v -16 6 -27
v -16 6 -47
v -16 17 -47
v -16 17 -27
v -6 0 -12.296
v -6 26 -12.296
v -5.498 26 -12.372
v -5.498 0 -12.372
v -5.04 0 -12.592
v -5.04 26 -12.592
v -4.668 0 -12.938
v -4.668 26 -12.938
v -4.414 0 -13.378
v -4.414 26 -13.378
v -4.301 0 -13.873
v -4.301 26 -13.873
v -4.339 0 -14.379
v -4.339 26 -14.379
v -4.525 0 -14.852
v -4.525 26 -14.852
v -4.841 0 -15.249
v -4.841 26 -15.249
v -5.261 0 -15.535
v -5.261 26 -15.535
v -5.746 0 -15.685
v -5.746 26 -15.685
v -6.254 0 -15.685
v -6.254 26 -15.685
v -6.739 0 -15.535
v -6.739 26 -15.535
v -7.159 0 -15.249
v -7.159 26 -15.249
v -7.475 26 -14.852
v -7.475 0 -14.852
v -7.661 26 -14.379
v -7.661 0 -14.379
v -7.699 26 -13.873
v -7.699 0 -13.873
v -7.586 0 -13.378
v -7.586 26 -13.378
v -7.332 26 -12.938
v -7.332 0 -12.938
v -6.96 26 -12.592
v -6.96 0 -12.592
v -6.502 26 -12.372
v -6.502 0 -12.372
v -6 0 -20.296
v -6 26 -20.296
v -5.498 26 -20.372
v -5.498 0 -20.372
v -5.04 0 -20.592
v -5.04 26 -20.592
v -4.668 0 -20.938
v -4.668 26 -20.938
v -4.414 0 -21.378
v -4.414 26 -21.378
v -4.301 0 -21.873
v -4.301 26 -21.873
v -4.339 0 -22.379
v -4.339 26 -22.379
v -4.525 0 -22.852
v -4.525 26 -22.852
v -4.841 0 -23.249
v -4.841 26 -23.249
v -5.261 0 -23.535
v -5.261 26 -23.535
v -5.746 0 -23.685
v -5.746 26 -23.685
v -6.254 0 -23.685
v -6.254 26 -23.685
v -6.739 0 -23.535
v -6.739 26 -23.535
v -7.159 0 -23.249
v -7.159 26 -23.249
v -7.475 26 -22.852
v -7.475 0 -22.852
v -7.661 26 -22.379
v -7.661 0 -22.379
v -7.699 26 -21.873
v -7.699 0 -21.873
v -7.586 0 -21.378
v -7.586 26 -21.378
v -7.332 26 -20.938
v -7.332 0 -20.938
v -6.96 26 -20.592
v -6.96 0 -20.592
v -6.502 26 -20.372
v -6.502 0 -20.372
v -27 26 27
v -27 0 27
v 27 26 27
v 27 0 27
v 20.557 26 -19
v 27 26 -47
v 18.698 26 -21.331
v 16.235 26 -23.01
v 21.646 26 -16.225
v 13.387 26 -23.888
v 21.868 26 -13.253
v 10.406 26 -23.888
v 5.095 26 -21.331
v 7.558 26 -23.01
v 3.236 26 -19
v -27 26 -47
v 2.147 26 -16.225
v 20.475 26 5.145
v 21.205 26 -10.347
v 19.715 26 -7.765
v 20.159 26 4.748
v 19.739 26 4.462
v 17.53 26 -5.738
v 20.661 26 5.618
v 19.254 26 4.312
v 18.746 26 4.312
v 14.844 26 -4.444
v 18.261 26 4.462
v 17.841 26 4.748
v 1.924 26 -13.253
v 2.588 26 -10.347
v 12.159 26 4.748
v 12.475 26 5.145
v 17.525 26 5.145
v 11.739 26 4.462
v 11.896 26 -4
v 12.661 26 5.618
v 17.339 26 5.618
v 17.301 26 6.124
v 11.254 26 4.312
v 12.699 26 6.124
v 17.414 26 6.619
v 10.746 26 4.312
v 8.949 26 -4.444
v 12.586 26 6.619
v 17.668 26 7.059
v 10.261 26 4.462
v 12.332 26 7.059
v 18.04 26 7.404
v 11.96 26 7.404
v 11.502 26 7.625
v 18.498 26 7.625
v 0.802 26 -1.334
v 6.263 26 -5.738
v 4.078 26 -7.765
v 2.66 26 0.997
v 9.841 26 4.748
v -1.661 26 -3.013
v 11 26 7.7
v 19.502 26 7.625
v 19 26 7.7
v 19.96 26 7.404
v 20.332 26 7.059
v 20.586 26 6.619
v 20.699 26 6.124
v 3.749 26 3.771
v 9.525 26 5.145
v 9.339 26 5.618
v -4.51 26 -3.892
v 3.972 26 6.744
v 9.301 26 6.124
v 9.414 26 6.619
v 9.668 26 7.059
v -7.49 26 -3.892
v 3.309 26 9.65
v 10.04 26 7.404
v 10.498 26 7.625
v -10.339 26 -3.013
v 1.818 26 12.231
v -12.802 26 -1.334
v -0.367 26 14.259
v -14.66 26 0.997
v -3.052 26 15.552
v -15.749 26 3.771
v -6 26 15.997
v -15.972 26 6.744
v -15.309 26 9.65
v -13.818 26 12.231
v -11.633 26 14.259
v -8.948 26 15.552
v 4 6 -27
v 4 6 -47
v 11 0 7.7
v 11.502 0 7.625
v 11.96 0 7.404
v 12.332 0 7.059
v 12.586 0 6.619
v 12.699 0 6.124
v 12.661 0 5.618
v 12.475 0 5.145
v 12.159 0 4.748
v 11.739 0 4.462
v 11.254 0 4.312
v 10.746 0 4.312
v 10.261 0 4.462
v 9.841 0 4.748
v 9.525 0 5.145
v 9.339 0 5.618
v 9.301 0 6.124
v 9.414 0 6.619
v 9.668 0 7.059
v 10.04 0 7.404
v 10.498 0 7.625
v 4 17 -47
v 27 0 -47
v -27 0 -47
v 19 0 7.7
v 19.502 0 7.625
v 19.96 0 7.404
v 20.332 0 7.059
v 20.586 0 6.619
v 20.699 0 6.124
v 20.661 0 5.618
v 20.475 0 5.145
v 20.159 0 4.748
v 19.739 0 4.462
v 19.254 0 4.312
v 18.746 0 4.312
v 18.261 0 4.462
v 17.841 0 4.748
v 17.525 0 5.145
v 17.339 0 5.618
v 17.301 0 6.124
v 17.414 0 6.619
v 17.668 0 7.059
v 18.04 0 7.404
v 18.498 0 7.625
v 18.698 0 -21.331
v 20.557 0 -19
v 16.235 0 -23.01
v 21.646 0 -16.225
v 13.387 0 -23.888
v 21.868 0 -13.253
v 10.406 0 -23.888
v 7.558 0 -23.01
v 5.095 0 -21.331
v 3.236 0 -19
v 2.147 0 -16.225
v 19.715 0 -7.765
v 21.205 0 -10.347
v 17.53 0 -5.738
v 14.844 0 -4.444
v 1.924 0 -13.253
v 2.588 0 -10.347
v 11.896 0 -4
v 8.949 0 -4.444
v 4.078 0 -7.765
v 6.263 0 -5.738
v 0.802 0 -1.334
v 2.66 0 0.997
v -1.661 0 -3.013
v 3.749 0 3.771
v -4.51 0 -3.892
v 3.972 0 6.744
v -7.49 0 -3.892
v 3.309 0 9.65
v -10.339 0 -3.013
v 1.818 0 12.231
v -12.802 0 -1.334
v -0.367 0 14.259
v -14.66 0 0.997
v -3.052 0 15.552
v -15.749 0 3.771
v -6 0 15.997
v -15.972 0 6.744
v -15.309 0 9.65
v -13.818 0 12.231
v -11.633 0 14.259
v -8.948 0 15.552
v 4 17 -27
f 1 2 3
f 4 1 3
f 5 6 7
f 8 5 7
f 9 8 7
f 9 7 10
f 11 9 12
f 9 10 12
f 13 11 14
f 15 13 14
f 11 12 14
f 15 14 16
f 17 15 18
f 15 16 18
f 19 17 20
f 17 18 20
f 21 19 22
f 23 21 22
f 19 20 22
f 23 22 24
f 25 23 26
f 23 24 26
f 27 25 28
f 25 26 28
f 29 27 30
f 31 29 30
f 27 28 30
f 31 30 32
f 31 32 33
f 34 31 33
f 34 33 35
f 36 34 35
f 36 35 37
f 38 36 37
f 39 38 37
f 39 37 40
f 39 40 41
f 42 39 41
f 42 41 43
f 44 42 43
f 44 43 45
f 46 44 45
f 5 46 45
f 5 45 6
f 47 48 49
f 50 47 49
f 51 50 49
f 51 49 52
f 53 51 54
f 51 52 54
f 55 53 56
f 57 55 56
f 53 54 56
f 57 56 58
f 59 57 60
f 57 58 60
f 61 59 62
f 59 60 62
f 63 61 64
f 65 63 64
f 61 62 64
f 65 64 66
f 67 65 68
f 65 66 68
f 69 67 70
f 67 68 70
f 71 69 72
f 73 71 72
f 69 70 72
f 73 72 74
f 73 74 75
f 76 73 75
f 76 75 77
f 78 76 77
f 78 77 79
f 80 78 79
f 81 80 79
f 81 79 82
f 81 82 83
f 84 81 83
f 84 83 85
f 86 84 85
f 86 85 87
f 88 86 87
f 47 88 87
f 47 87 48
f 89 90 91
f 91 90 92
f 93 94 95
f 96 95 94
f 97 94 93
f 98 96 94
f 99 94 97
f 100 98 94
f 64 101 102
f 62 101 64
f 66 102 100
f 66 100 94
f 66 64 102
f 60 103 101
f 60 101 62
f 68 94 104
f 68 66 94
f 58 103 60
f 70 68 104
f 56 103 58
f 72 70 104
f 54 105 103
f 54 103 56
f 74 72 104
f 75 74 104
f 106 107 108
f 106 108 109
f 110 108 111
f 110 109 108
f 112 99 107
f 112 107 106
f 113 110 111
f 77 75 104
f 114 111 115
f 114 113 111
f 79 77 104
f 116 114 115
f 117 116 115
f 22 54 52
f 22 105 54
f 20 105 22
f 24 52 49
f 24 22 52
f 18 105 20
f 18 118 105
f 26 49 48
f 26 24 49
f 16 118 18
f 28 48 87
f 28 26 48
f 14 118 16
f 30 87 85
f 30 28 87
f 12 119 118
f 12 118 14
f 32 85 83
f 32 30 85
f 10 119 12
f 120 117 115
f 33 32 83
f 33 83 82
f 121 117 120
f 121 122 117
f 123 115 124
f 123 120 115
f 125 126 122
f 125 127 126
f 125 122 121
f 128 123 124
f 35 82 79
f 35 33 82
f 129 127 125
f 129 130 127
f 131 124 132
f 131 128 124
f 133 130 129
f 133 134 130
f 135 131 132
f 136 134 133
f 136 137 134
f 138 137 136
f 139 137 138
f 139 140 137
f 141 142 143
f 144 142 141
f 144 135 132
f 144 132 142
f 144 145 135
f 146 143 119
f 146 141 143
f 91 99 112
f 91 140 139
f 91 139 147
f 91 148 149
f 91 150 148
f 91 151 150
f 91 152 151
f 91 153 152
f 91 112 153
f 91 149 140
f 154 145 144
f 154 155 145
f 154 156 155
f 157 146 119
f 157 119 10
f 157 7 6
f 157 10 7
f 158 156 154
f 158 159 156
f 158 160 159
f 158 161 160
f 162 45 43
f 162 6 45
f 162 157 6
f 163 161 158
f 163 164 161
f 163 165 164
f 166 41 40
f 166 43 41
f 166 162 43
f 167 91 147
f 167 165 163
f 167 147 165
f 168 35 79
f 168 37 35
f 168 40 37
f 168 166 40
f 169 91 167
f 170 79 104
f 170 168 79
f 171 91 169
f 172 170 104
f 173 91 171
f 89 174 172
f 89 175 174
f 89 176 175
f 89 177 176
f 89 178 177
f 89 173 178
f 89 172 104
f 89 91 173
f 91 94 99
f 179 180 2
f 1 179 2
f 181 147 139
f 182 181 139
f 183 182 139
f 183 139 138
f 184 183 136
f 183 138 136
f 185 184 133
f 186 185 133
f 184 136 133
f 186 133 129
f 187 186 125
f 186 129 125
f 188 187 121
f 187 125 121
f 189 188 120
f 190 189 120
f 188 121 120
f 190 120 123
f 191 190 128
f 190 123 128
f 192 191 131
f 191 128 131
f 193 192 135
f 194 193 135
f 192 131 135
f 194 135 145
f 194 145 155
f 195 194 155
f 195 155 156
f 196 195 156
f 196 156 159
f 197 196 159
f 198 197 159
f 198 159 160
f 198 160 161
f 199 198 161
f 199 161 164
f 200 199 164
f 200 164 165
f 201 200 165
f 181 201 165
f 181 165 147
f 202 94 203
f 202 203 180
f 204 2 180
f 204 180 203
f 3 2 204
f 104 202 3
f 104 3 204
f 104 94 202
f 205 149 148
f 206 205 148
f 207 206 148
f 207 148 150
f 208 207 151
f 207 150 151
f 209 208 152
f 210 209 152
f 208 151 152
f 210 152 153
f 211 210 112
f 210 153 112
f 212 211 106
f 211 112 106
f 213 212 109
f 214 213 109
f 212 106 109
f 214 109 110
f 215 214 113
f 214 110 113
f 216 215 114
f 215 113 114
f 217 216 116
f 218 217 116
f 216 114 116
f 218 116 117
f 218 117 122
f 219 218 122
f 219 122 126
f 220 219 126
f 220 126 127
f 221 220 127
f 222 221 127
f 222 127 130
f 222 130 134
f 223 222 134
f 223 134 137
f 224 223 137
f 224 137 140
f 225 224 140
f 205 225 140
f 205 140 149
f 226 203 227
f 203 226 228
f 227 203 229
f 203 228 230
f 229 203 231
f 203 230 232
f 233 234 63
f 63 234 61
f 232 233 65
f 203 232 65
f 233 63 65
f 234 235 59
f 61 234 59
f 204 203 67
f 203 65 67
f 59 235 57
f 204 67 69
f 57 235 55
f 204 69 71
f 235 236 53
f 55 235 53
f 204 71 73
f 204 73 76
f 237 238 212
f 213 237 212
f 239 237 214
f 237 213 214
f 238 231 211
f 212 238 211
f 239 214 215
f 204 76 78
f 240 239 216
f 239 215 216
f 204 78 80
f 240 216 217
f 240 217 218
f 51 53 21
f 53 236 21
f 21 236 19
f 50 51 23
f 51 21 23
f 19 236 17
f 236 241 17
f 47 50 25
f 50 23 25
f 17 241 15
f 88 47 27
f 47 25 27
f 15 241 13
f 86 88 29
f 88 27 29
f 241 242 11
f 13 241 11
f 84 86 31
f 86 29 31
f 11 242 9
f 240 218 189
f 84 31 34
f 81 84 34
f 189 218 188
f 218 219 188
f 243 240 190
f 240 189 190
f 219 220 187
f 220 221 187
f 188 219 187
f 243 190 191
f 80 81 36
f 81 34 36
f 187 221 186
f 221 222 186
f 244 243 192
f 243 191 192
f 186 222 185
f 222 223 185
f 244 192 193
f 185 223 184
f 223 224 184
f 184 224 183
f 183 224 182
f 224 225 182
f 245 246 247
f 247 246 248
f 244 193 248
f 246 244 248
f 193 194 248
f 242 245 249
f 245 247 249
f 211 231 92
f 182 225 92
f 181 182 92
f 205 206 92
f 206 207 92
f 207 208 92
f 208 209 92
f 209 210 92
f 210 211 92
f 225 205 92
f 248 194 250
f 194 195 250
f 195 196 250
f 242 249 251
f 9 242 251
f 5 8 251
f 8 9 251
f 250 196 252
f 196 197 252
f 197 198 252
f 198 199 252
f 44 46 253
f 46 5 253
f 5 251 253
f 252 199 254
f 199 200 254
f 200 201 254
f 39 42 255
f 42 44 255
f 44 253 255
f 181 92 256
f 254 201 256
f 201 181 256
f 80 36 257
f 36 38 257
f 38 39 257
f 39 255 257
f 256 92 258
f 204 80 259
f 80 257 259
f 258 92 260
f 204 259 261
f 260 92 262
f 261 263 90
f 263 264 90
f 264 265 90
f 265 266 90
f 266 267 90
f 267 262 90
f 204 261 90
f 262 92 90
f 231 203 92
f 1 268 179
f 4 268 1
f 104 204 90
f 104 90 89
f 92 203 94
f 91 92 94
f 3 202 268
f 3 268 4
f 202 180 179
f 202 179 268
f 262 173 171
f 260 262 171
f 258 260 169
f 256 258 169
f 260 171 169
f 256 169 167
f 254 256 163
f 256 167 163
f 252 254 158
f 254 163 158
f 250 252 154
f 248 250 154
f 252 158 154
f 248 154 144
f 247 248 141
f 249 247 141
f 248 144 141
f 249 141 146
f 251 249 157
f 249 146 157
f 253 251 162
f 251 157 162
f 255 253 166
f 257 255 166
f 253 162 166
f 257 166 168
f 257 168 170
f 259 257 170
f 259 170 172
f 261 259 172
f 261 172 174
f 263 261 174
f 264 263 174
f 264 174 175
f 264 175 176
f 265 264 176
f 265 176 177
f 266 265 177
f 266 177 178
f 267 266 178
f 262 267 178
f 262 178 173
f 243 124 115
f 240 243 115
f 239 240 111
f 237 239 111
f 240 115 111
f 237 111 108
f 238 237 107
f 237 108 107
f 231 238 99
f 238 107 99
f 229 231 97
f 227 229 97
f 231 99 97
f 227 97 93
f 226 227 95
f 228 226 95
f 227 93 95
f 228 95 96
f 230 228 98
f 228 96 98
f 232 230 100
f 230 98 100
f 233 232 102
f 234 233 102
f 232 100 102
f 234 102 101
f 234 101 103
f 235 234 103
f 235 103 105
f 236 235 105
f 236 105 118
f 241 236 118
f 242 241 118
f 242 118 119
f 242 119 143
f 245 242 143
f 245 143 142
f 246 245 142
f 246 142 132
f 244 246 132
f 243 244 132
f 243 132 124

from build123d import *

# Parameters (mm, degrees)
SKETCH1_W           = 54
SKETCH1_H           = 54
BOSS_EXTRUDE1_DEPTH = 26
SKETCH2_R           = 1.70360319
SKETCH2_R_2         = 10
CUT_EXTRUDE1_DEPTH  = 47.19523785
SKETCH3_W           = 54
SKETCH3_H           = 26
BOSS_EXTRUDE2_DEPTH = 20
SKETCH4_W           = 20
SKETCH4_H           = 11
CUT_EXTRUDE2_DEPTH  = 20


with BuildPart() as part:
    # Sketch1 → Boss-Extrude1 (new body)
    with BuildSketch(Plane(origin=(0, 0, 0), x_dir=(1, 0, 0), z_dir=(0, 1, 0))):
        Rectangle(SKETCH1_W, SKETCH1_H)
    extrude(amount=BOSS_EXTRUDE1_DEPTH)

    # Sketch2 → Cut-Extrude1 (cut, through all)
    with BuildSketch(Plane(origin=(0, 26, 0), x_dir=(1, 0, 0), z_dir=(0, 1, 0))):
        with Locations(Location((-6, 22, 0), (0, 0, 270))):
            Circle(SKETCH2_R)
        with Locations(Location((-6, 14, 0), (0, 0, 270))):
            Circle(SKETCH2_R)
        with Locations(Location((19, -5.996588382, 0), (0, 0, 270))):
            Circle(SKETCH2_R)
        with Locations(Location((11, -5.996588382, 0), (0, 0, 270))):
            Circle(SKETCH2_R)
        with Locations(Location((11.896457598, 14, 0), (0, 0, 270))):
            Circle(SKETCH2_R_2)
        with Locations(Location((-6, -5.996588382, 0), (0, 0, 270))):
            Circle(SKETCH2_R_2)
    extrude(amount=-CUT_EXTRUDE1_DEPTH, mode=Mode.SUBTRACT)

    # Sketch3 → Boss-Extrude2 (add)
    with BuildSketch(Plane(origin=(0, 0, -27), x_dir=(-1, 0, 0), z_dir=(0, 0, -1))):
        with Locations((0, 13)):
            Rectangle(SKETCH3_W, SKETCH3_H)
    extrude(amount=BOSS_EXTRUDE2_DEPTH)

    # Sketch4 → Cut-Extrude2 (cut)
    with BuildSketch(Plane(origin=(0, 0, -47), x_dir=(-1, 0, 0), z_dir=(0, 0, -1))):
        with Locations((6, 11.5)):
            Rectangle(SKETCH4_W, SKETCH4_H)
    extrude(amount=-CUT_EXTRUDE2_DEPTH, mode=Mode.SUBTRACT)


solid = part.part
